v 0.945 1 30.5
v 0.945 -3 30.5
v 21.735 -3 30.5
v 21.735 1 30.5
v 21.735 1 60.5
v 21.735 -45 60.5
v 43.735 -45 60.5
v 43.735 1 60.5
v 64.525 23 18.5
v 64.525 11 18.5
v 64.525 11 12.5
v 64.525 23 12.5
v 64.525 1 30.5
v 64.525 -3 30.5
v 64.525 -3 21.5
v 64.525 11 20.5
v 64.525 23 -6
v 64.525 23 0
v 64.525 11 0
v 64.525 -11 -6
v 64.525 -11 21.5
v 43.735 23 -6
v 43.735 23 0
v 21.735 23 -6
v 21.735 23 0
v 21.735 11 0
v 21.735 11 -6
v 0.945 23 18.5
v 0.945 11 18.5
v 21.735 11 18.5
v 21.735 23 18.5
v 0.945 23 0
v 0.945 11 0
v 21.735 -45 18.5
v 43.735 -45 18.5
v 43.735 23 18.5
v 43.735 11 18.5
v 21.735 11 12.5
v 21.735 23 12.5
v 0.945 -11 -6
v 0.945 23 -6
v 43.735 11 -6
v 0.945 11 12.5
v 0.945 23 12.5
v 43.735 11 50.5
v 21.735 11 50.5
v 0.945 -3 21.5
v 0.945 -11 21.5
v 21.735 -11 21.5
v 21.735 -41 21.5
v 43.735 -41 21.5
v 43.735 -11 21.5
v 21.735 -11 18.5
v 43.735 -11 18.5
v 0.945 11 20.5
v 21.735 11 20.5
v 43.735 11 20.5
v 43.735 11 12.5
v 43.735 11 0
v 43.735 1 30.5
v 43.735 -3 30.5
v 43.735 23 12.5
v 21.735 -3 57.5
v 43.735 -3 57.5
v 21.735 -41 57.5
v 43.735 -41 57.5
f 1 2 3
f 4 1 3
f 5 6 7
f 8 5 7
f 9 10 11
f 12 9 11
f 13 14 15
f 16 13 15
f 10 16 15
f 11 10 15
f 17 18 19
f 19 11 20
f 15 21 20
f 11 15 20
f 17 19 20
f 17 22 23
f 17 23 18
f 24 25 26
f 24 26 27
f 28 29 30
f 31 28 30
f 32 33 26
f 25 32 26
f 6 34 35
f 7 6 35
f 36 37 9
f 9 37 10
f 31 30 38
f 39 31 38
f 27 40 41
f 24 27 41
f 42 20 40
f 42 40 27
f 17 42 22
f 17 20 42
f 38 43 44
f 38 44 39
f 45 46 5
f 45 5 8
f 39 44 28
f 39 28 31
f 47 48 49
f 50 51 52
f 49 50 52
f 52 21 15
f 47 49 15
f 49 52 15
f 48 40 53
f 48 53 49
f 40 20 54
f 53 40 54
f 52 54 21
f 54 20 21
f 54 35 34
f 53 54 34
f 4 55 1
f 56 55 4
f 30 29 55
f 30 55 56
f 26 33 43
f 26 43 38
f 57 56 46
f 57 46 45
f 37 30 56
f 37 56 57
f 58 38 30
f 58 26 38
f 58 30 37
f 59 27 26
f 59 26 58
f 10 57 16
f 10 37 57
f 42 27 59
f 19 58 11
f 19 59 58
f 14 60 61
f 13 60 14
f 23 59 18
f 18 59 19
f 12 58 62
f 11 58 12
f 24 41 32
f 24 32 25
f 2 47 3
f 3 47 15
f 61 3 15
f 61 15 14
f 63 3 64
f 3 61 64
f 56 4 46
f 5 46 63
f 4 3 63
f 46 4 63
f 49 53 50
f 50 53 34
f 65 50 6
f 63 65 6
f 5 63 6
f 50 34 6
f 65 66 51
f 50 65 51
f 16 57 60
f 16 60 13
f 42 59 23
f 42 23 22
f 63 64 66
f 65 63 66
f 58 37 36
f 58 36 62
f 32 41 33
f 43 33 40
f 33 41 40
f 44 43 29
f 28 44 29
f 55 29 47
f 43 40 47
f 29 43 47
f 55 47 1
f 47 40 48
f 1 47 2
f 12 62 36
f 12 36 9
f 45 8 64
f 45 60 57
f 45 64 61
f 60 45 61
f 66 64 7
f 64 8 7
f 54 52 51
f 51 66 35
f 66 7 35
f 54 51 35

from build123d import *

# Parameters (mm, degrees)
BOSS_EXTRUDE2_DEPTH   = 23
SKETCH1_W             = 20.789980378
SKETCH1_H             = 6
BOSS_EXTRUDE2_2_DEPTH = 23
BOSS_EXTRUDE2_3_DEPTH = 23
BOSS_EXTRUDE2_4_DEPTH = 23
SKETCH1_3_W           = 20.789980378
SKETCH1_3_H           = 36.5
BOSS_EXTRUDE3_DEPTH   = 11
BOSS_EXTRUDE5_DEPTH   = 45
SKETCH2_W             = 9
SKETCH2_H             = 8
CUT_EXTRUDE1_DEPTH    = 106.353028551
SKETCH3_W             = 24.5
SKETCH3_H             = 11
BOSS_EXTRUDE6_DEPTH   = 42
BOSS_EXTRUDE7_DEPTH   = 11
CHAMFER2_SIZE         = 10


with BuildPart() as part:
    # Sketch1 → Boss-Extrude2 (new body)
    with BuildSketch(Plane(origin=(0, 0, 0), x_dir=(1, 0, 0), z_dir=(0, 1, 0))):
        Polygon((0.945063883, 6), (0.945063883, 0), (1.890127766, 0), (21.735044261, 0), (21.735044261, 6), align=None)
    extrude(amount=BOSS_EXTRUDE2_DEPTH)



with BuildPart() as body_2:
    # Sketch1 → Boss-Extrude2 2 (new body)
    with BuildSketch(Plane(origin=(0, 0, 0), x_dir=(1, 0, 0), z_dir=(0, 1, 0))):
        with Locations((11.340054072, -15.5)):
            Rectangle(SKETCH1_W, SKETCH1_H)
    extrude(amount=BOSS_EXTRUDE2_2_DEPTH)


with BuildPart() as body_3:
    # Sketch1 → Boss-Extrude2 3 (new body)
    with BuildSketch(Plane(origin=(0, 0, 0), x_dir=(1, 0, 0), z_dir=(0, 1, 0))):
        with Locations((54.13003445, -15.5)):
            Rectangle(SKETCH1_W, SKETCH1_H)
    extrude(amount=BOSS_EXTRUDE2_3_DEPTH)


with BuildPart() as body_4:
    # Sketch1 → Boss-Extrude2 4 (new body)
    with BuildSketch(Plane(origin=(0, 0, 0), x_dir=(1, 0, 0), z_dir=(0, 1, 0))):
        with Locations((54.13003445, 3)):
            Rectangle(SKETCH1_W, SKETCH1_H)
    extrude(amount=BOSS_EXTRUDE2_4_DEPTH)


with BuildPart() as part_1:
    add(part.part)

    add(body_2.part)  # Boss-Extrude3 merges body 2
    # Sketch1<3> → Boss-Extrude3 (add)
    with BuildSketch(Plane(origin=(0, 0, 0), x_dir=(1, 0, 0), z_dir=(0, 1, 0))):
        with Locations((11.340054072, -12.25)):
            Rectangle(SKETCH1_3_W, SKETCH1_3_H)
        with Locations((54.13003445, -12.25)):
            Rectangle(SKETCH1_3_W, SKETCH1_3_H)
    extrude(amount=-BOSS_EXTRUDE3_DEPTH)

    # Sketch1<6> → Boss-Extrude5 (add)
    with BuildSketch(Plane(origin=(0, 0, 0), x_dir=(1, 0, 0), z_dir=(0, 1, 0))):
        Polygon((43.735044261, -18.5), (32.735044261, -18.5), (32.735044261, -60.5), (43.735044261, -60.5), (43.735044261, -30.5), align=None)
        Polygon((32.735044261, -18.5), (21.735044261, -18.5), (21.735044261, -30.5), (21.735044261, -60.5), (32.735044261, -60.5), align=None)
    extrude(amount=-BOSS_EXTRUDE5_DEPTH)

    # Sketch2 → Cut-Extrude1 (cut, through all)
    with BuildSketch(Plane(origin=(74.525024639, 0, 0), x_dir=(0, 0, -1), z_dir=(1, 0, 0))):
        Polygon((-30.5, -11), (-30.5, -3), (-41.183889214, -3), (-57.5, -3), (-57.5, -14.989659462), (-57.5, -41), (-21.5, -41), (-21.5, -11), align=None)
        with Locations((-26, -7)):
            Rectangle(SKETCH2_W, SKETCH2_H)
    extrude(amount=-CUT_EXTRUDE1_DEPTH, mode=Mode.SUBTRACT)


    add(body_3.part)  # Boss-Extrude6 merges body 3

    add(body_4.part)  # Boss-Extrude6 merges body 4
    # Sketch3 → Boss-Extrude6 (add)
    with BuildSketch(Plane.ZY.offset(-43.735044261)):
        with Locations((6.25, -5.5)):
            Rectangle(SKETCH3_W, SKETCH3_H)
    extrude(amount=BOSS_EXTRUDE6_DEPTH)

    # Sketch4 → Boss-Extrude7 (add)
    with BuildSketch(Plane(origin=(0, 0, 0), x_dir=(1, 0, 0), z_dir=(0, 1, 0))):
        Polygon((64.525024639, -18.5), (43.735044261, -18.5), (43.735044261, -12.5), (64.525024639, -12.5), (64.525024639, 0), (43.735044261, 0), (43.735044261, 6), (21.735044261, 6), (21.735044261, 0), (0.945063883, 0), (0.945063883, -12.5), (21.735044261, -12.5), (21.735044261, -18.5), (0.945063883, -18.5), (0.945063883, -30.5), (21.735044261, -30.5), (21.735044261, -60.5), (43.735044261, -60.5), (43.735044261, -30.5), (64.525024639, -30.5), align=None)
    extrude(amount=BOSS_EXTRUDE7_DEPTH)

    # Chamfer2
    chamfer2_edges = [part_1.edges().sort_by_distance(p)[0] for p in [
        (11.340054072, 11, 30.5),
        (32.735044261, 11, 60.5),
        (54.13003445, 11, 30.5),
    ]]
    chamfer(chamfer2_edges, length=CHAMFER2_SIZE)


solid = part_1.part
